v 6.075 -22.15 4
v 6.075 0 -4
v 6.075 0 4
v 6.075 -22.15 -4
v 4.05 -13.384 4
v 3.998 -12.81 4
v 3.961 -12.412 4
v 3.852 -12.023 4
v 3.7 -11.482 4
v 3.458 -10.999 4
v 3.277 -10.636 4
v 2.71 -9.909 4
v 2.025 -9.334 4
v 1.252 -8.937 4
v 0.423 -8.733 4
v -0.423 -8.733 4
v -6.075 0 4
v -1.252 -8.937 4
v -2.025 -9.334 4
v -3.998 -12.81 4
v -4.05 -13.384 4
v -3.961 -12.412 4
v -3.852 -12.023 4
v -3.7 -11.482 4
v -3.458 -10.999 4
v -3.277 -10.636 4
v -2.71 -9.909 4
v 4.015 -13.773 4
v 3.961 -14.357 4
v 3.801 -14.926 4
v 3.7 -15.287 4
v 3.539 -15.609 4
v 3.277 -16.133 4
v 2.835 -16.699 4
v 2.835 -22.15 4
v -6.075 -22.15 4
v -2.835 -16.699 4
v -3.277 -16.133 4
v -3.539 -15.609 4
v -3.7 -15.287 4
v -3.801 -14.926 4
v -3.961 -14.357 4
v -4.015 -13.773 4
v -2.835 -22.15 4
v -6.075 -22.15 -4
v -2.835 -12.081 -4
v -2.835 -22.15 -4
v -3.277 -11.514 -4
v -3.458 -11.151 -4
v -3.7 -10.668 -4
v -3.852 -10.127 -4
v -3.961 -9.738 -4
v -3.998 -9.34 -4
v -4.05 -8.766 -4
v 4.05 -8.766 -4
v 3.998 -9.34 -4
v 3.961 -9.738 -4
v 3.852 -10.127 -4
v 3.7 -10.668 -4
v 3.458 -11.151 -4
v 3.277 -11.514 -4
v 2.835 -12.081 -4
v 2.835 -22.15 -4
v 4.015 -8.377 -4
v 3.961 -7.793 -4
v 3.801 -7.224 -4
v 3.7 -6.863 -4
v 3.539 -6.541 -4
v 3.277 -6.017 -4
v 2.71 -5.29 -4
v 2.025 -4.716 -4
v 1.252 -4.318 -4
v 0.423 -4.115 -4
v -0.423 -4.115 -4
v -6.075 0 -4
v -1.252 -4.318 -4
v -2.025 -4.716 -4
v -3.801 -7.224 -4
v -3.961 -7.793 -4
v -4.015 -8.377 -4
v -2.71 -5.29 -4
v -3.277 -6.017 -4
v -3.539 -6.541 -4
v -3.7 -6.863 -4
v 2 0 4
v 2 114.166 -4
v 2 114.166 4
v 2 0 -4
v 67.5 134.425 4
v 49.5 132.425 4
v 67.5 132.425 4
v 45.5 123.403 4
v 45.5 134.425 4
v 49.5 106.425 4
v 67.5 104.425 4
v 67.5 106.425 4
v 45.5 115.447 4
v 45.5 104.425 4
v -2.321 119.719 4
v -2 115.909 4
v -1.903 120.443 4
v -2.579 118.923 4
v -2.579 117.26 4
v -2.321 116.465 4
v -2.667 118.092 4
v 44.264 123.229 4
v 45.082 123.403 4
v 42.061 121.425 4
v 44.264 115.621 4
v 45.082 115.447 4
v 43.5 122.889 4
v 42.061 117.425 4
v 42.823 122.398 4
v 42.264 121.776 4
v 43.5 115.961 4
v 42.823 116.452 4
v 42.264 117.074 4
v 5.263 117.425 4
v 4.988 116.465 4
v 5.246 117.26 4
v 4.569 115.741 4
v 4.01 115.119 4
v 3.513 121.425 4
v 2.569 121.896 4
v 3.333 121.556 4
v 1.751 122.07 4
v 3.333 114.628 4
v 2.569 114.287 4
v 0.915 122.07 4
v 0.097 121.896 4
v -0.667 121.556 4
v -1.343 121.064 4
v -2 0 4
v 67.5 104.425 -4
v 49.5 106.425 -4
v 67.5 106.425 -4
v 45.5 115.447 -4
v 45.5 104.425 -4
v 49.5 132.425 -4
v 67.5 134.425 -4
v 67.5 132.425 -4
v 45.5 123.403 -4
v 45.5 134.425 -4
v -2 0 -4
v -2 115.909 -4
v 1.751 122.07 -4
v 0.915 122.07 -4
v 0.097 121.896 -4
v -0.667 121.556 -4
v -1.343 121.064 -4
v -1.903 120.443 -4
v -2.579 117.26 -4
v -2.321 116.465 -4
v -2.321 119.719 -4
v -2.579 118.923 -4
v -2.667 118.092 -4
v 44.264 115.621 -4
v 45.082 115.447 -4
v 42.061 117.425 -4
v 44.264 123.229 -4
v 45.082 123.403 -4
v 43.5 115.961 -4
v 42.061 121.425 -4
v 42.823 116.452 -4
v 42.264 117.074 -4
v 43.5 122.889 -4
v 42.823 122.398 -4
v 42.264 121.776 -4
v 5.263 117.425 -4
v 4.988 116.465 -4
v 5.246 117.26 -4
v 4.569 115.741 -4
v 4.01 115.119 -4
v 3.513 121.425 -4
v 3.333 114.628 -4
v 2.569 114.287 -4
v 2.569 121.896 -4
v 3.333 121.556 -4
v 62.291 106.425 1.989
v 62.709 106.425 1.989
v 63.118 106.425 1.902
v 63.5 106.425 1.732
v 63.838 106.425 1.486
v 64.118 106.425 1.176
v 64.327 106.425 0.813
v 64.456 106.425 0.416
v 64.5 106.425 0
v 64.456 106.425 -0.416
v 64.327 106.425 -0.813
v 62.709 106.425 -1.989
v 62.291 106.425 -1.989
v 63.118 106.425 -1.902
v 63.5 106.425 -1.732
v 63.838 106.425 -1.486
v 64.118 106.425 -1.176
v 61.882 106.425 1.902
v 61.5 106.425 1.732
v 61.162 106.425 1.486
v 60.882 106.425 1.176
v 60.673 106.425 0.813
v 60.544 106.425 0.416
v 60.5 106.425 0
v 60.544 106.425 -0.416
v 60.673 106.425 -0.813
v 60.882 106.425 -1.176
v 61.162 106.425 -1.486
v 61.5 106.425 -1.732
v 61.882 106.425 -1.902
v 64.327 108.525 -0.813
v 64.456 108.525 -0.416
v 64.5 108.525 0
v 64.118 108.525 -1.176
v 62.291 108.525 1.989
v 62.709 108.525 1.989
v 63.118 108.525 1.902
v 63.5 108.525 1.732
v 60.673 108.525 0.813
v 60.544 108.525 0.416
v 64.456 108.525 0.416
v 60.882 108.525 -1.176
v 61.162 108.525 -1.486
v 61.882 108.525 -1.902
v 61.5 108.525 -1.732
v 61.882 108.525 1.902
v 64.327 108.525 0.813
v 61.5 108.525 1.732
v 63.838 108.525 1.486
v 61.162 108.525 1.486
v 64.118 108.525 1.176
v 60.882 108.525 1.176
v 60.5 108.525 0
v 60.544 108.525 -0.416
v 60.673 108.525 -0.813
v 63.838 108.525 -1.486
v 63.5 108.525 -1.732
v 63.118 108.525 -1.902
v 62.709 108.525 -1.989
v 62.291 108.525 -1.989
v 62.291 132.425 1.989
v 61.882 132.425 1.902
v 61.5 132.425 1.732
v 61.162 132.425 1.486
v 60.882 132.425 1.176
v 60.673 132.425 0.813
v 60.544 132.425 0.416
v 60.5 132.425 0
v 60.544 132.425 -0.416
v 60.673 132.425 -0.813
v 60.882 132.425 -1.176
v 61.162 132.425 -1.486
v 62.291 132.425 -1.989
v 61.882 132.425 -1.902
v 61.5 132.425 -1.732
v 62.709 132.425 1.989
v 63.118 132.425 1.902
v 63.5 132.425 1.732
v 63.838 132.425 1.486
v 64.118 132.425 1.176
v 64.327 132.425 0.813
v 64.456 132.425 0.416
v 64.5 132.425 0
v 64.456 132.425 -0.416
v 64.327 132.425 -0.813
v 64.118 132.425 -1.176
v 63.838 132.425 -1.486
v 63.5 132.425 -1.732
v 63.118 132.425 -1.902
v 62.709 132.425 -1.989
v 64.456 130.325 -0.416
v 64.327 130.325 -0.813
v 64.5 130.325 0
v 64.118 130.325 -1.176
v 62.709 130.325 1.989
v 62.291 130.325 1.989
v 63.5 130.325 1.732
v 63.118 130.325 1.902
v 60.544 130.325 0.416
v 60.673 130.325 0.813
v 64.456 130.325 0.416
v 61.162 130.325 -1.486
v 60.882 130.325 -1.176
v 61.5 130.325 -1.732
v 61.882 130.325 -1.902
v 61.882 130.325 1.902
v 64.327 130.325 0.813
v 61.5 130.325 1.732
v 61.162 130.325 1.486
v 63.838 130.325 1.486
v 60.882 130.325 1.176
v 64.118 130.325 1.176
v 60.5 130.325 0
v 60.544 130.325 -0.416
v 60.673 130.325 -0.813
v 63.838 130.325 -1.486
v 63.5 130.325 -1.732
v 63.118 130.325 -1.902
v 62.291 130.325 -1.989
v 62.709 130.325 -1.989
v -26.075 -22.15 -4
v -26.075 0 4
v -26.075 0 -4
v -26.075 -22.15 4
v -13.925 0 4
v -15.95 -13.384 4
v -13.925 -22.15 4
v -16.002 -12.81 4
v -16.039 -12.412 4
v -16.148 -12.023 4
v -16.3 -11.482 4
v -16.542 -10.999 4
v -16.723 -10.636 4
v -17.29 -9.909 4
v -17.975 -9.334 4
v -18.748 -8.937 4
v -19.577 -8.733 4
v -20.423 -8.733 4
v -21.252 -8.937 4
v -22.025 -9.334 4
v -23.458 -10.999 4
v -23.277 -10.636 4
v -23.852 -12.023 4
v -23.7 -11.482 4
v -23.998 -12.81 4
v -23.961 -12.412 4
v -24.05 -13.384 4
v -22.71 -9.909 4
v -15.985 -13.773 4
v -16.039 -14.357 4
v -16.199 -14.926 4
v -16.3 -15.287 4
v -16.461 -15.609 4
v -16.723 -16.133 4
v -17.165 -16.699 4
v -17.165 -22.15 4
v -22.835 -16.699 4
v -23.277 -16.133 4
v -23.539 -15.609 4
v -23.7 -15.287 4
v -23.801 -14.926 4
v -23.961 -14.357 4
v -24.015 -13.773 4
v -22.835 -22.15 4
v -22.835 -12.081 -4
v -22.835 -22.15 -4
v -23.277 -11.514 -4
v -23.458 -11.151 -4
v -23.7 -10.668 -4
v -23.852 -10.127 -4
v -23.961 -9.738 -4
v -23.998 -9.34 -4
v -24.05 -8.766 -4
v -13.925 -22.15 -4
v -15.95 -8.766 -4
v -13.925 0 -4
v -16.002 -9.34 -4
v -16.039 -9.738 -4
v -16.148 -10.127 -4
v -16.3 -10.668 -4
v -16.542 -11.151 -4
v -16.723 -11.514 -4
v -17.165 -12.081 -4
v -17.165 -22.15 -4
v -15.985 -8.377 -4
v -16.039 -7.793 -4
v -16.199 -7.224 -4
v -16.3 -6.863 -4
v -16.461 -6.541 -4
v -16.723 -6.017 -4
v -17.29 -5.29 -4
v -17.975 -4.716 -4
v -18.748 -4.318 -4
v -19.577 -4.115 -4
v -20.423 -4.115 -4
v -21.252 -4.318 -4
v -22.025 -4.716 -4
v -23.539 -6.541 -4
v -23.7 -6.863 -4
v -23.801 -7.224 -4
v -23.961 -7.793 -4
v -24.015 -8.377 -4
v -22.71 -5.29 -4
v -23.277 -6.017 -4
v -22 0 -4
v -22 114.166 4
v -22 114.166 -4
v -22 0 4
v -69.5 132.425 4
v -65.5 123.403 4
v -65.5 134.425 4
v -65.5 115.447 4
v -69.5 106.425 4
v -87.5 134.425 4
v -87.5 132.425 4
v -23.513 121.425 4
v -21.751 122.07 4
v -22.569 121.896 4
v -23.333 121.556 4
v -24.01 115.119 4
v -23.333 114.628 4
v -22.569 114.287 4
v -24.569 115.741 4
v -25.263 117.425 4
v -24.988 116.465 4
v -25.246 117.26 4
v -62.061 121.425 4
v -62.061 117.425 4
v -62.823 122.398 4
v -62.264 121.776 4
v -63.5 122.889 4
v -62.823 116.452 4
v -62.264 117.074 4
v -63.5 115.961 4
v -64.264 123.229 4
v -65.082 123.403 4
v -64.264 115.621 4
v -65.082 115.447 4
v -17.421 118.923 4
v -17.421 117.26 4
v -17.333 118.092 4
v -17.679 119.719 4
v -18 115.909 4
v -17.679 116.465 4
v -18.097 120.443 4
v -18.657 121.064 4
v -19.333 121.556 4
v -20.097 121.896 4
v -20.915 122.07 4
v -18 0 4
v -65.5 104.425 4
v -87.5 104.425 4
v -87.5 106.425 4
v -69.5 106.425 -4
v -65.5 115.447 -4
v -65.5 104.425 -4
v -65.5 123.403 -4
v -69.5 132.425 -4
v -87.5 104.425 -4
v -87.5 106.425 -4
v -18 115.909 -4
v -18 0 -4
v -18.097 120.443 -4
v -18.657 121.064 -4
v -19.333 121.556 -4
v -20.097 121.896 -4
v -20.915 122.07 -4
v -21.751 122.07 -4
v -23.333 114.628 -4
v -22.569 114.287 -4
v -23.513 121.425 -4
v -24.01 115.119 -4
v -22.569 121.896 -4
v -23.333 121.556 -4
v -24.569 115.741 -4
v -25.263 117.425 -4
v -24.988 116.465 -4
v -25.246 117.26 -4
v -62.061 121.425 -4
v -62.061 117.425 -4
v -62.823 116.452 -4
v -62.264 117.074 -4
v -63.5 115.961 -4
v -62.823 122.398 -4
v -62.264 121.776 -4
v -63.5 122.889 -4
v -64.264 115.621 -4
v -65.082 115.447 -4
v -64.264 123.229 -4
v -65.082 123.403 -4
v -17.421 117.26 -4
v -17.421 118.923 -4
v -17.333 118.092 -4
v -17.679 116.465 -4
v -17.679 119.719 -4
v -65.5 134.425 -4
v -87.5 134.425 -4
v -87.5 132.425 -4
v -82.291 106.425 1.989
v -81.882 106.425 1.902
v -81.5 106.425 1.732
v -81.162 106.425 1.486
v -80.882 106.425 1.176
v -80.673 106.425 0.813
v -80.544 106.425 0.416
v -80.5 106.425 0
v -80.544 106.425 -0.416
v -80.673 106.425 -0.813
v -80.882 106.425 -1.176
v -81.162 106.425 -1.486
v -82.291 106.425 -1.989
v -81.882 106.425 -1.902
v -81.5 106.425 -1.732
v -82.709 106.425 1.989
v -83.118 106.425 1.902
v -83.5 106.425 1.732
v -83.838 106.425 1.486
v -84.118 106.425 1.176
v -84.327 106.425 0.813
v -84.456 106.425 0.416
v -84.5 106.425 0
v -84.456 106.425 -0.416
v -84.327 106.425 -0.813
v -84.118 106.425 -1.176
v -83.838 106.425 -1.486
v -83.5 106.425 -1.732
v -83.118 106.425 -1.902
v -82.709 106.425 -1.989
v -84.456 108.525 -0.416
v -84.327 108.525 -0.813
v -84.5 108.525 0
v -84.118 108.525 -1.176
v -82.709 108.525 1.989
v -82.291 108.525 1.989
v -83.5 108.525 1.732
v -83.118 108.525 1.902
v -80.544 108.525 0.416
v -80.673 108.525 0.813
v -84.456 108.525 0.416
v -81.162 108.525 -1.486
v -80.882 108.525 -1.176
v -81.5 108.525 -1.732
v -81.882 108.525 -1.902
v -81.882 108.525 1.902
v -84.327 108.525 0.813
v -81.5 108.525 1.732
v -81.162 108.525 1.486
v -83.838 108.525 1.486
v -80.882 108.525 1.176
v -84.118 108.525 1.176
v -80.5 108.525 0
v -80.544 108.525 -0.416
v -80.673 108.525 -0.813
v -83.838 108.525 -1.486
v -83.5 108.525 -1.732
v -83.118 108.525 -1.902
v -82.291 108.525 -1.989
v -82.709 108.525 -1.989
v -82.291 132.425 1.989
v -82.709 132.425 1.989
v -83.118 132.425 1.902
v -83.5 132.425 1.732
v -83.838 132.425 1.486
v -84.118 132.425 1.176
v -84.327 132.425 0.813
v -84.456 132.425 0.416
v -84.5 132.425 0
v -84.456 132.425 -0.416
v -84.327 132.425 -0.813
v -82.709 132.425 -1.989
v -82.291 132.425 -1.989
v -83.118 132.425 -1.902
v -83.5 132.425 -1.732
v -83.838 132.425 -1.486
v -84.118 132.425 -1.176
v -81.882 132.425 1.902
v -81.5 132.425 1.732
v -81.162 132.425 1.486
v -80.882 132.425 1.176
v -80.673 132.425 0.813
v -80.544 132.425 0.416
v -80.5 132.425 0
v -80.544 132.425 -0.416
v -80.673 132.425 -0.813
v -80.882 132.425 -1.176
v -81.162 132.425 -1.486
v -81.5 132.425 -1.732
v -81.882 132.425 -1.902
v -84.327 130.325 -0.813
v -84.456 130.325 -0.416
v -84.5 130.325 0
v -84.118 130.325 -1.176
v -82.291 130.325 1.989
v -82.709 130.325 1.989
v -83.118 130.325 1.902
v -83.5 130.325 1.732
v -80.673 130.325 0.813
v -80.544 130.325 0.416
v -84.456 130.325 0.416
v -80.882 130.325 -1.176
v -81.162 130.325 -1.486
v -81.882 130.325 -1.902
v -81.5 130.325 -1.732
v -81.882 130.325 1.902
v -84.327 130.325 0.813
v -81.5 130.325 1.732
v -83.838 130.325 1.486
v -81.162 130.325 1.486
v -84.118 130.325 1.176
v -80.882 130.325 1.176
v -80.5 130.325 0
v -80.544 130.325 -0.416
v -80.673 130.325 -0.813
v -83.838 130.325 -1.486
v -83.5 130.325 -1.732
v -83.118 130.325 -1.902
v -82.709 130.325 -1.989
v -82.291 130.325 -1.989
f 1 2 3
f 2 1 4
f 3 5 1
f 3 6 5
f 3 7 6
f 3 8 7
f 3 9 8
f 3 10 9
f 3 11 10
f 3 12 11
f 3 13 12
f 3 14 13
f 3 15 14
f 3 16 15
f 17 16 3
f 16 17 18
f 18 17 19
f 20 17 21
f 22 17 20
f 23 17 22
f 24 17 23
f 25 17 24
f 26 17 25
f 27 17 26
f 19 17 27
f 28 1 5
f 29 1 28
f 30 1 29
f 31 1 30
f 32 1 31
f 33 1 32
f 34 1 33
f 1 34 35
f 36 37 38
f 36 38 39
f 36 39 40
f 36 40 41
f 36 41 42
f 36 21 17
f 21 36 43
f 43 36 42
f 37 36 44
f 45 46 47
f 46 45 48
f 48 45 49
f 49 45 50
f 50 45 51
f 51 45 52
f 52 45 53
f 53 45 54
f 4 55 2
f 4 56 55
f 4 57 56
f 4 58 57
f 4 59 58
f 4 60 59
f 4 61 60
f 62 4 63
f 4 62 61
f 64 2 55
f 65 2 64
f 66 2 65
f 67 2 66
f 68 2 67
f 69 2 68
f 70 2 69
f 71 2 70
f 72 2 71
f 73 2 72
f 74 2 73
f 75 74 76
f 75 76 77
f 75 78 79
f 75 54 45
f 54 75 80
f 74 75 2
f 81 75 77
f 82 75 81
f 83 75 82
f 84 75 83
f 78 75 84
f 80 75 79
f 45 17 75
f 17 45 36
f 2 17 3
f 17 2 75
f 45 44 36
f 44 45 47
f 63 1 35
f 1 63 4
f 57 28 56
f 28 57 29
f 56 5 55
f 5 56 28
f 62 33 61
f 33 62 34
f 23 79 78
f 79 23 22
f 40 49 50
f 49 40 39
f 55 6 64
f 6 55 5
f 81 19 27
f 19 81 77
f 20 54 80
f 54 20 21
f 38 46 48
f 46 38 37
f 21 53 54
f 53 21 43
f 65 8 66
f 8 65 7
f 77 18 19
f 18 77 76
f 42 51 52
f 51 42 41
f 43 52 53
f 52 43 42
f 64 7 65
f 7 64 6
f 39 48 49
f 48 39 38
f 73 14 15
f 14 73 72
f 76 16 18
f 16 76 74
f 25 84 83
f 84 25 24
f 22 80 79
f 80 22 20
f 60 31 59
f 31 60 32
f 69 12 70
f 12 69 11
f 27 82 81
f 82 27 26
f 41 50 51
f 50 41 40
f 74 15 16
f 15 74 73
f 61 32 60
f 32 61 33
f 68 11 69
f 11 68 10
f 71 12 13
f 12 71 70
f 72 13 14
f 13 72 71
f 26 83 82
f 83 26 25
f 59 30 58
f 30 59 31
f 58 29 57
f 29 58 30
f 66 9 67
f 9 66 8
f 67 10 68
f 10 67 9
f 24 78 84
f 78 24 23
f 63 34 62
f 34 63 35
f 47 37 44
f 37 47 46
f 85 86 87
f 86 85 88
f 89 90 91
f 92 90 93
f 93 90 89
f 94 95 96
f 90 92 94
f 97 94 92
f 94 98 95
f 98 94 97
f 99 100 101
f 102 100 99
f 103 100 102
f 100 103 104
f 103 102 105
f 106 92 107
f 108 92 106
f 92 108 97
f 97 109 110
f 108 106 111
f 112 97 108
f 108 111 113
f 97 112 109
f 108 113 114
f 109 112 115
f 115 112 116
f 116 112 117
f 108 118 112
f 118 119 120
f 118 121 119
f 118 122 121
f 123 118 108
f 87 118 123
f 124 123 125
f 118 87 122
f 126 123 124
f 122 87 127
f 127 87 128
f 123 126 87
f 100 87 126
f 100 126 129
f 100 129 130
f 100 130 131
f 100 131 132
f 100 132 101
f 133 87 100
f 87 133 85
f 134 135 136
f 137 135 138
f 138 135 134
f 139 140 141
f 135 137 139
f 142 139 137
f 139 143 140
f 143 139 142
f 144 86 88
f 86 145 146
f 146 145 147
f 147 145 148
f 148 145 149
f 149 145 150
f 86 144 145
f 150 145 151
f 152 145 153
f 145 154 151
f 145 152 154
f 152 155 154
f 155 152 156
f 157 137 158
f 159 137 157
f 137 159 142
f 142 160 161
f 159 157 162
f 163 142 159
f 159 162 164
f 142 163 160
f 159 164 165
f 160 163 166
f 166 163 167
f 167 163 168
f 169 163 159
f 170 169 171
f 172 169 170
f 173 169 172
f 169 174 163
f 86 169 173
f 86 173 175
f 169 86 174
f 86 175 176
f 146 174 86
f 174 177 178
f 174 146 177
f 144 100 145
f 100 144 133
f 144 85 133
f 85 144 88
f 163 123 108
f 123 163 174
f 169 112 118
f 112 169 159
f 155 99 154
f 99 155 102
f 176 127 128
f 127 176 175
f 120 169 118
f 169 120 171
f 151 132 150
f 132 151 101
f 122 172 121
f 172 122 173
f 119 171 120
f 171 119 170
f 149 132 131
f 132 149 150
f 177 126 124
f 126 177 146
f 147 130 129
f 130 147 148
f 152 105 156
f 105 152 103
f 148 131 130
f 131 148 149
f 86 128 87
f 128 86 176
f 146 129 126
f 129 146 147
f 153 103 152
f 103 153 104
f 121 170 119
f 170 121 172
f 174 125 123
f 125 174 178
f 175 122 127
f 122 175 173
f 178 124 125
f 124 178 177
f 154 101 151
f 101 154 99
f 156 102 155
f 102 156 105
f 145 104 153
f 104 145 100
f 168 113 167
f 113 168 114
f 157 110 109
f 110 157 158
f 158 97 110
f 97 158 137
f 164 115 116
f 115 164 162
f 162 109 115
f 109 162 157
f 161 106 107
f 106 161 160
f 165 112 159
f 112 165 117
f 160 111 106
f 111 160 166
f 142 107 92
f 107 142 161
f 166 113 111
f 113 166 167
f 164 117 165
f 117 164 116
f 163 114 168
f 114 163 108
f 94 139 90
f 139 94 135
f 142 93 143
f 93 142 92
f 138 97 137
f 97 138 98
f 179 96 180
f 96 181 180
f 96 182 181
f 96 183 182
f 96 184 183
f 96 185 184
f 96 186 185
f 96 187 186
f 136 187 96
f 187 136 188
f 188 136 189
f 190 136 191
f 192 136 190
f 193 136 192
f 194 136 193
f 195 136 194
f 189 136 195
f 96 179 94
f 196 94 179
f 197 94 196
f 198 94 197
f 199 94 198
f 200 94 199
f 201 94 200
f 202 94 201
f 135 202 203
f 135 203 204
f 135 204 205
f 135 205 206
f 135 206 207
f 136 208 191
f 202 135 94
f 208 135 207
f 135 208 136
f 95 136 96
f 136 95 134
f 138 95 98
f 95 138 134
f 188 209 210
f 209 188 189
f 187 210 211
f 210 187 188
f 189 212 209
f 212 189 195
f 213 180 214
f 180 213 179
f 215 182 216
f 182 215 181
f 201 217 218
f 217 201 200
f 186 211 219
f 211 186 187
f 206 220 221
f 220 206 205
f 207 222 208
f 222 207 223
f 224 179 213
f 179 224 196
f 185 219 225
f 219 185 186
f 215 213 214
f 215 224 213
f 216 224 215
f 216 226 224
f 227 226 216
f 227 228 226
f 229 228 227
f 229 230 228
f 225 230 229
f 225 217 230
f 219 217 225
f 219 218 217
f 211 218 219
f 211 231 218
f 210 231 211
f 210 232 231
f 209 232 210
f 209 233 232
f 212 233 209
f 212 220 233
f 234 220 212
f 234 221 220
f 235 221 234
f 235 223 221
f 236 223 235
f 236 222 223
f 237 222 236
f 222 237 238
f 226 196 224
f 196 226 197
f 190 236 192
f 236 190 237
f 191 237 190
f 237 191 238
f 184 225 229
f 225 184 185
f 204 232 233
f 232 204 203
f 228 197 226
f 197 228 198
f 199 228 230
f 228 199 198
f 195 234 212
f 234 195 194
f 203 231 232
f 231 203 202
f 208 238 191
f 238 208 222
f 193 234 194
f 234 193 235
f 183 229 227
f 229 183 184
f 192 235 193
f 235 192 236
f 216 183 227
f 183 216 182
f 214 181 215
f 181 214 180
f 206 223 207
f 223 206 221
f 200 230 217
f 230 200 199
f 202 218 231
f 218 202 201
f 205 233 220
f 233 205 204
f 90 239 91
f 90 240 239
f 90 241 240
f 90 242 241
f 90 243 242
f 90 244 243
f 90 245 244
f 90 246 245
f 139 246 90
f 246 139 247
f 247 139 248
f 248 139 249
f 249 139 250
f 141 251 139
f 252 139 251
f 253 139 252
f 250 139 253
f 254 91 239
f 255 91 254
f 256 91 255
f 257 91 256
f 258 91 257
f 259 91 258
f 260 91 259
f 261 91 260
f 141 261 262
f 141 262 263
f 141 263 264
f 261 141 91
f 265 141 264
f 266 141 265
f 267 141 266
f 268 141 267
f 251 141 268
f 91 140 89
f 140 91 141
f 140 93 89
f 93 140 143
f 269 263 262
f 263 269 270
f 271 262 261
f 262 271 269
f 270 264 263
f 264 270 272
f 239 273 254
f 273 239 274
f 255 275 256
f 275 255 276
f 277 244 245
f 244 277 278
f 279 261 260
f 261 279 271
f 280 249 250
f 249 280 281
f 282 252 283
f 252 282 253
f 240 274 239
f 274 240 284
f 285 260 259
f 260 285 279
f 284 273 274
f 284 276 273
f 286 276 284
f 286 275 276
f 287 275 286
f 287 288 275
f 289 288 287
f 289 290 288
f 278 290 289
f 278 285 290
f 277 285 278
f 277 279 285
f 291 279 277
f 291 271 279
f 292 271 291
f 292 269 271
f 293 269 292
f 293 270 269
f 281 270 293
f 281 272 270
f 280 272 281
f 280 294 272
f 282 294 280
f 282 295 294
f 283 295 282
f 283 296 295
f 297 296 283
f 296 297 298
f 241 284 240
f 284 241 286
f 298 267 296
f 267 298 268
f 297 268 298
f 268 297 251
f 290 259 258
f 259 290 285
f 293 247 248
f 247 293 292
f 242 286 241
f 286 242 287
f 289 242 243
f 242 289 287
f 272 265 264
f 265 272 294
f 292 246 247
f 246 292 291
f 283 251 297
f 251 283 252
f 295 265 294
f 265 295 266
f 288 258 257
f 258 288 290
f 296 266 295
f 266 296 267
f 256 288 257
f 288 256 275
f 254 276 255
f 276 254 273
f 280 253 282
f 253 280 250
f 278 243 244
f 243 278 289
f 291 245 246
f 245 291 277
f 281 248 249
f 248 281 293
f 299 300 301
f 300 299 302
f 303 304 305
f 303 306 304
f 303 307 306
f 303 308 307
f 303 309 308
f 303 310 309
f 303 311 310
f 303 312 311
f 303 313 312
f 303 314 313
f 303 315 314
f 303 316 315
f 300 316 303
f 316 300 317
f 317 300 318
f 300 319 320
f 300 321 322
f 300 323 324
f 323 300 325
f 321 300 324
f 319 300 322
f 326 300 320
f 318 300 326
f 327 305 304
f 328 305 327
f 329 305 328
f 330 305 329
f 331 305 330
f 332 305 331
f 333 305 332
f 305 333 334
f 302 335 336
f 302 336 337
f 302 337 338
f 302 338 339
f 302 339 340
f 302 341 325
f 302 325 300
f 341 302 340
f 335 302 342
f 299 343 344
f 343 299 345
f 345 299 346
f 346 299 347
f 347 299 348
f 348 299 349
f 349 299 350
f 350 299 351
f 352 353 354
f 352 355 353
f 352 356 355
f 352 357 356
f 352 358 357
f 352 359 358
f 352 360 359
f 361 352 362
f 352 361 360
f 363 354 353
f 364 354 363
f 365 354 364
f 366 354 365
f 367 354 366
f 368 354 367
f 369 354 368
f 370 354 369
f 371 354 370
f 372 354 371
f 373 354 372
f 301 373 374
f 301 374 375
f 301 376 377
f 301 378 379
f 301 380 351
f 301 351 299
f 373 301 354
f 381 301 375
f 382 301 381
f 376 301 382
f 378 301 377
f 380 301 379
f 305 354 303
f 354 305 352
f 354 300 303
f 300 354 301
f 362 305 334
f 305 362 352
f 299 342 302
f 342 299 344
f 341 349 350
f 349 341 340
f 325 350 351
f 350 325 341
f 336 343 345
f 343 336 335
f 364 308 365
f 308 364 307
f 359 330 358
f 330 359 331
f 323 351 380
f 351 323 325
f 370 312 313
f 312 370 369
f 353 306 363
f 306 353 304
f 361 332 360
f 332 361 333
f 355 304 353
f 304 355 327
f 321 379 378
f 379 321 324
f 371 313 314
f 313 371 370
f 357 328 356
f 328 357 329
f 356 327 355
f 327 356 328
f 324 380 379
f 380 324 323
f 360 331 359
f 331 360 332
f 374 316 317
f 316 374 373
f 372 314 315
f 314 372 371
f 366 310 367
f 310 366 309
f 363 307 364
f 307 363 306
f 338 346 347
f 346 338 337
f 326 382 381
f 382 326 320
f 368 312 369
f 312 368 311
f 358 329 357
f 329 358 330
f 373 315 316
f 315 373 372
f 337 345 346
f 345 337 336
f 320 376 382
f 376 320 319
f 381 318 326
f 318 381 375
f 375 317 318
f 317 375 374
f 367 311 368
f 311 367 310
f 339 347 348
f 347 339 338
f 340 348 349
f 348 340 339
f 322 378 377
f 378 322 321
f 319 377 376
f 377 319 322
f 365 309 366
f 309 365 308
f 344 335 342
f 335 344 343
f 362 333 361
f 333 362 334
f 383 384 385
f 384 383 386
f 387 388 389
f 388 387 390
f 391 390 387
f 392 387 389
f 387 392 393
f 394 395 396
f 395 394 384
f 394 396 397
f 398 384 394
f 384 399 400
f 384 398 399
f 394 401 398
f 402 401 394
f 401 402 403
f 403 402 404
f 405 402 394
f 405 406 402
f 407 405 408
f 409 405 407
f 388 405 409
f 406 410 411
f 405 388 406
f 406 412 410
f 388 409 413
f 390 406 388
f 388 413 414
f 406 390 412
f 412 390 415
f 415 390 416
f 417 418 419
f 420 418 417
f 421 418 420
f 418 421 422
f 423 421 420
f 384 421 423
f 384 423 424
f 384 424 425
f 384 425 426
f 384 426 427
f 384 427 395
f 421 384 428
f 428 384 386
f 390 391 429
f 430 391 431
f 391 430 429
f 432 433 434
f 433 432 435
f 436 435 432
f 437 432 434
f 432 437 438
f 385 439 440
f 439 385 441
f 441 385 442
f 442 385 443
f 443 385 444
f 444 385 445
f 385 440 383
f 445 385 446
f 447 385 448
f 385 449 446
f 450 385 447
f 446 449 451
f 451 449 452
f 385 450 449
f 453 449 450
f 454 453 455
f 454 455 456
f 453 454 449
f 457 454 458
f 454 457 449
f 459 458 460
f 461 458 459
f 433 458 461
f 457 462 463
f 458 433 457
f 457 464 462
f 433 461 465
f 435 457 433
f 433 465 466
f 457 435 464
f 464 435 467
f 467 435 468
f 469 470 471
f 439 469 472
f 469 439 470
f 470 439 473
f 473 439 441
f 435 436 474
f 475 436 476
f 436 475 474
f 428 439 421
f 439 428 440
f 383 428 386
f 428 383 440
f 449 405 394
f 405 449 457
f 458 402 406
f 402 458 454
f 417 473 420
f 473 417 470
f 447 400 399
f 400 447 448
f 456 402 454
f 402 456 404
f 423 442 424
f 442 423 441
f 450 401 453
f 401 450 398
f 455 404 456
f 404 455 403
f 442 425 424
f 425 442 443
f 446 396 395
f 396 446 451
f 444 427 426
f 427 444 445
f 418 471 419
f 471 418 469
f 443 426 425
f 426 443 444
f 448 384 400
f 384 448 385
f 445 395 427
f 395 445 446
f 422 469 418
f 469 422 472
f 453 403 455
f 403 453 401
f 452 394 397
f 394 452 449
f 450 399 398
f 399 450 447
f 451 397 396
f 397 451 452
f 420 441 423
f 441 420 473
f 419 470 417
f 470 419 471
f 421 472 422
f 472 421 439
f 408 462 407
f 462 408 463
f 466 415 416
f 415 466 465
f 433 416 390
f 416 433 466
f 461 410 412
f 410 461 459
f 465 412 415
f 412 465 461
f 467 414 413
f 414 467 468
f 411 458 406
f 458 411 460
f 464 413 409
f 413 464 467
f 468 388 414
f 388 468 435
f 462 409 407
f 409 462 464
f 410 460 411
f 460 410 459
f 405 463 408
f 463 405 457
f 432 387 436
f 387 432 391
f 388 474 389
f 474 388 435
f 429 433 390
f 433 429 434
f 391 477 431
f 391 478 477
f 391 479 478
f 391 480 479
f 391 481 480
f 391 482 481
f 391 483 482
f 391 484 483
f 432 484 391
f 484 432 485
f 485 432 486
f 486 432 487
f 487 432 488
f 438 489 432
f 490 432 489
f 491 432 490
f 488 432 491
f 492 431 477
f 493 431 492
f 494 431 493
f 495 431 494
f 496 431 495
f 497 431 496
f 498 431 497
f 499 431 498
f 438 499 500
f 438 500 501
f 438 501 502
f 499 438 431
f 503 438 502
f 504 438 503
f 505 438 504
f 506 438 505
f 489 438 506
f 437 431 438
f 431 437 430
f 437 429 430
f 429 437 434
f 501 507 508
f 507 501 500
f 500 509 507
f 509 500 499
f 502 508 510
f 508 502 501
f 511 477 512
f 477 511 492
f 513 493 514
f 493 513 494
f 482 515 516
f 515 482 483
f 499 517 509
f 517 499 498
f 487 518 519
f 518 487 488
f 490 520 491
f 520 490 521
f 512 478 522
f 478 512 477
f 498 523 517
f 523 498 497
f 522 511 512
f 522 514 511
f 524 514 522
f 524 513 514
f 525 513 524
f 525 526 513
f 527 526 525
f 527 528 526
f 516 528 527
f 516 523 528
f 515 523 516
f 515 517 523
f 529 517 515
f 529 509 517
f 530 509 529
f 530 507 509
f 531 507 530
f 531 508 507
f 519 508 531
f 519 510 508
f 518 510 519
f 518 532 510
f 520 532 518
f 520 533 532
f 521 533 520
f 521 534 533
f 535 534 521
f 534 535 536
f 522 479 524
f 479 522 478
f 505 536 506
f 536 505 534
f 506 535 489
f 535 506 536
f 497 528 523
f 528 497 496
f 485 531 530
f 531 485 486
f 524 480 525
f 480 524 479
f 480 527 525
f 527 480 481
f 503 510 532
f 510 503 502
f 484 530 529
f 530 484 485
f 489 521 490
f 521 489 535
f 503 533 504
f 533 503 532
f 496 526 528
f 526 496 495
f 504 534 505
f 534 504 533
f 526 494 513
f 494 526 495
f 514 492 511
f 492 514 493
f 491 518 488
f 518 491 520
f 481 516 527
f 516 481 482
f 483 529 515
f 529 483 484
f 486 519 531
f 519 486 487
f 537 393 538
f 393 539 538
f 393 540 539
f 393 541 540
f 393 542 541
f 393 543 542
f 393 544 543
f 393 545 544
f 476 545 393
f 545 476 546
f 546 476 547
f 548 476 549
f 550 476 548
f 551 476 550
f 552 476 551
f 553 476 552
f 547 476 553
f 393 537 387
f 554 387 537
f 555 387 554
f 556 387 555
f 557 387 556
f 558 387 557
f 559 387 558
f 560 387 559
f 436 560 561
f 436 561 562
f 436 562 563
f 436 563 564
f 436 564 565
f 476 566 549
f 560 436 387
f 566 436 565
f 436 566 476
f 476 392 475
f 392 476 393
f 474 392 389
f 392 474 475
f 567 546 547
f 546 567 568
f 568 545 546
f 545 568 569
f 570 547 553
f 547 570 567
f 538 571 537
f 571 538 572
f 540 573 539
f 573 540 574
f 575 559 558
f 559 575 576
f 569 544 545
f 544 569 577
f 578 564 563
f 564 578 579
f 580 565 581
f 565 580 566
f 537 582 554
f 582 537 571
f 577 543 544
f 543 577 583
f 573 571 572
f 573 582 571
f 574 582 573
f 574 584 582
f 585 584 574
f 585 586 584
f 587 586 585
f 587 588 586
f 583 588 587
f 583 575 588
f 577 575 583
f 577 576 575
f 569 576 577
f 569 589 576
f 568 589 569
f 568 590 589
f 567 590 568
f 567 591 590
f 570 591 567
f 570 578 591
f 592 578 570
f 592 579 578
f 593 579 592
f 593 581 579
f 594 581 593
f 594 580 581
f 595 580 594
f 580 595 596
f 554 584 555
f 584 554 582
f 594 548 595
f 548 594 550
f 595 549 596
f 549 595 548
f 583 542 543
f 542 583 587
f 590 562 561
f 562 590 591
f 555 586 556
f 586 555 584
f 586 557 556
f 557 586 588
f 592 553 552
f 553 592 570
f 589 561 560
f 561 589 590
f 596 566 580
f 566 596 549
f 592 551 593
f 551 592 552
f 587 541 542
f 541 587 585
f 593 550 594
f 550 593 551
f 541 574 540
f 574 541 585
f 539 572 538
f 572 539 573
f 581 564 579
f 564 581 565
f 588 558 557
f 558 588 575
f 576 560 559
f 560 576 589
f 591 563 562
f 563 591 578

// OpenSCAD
//Rod Diameter
diameter=8.1 ;
//height of everything
height=8;
// Distance of the Fan from the middel of the Rod Y-direction
leangth=117.5;
//Distance of the mounting hole to the middel of the Rod in X direction ( not adjusted for clipangel different from 0)
width=62.5;
//angle of the Frame Rods, Mendel has 60° (change this to adjust the angle of the fan if you wnat to point it on the print bed)
rodangel=60;
//angle of the Clip, maybe you want to Fnas to mount like a V
clipangel=0;
//Ratio of the FrameMount Cutout
cutoutRatio=0.7;
//Fanwidth
fanwidth=26; 
//Leagth of the Grip arms, has to be smaller than width
gripleangth=17;


//making the grib module longer when changing the angel of the rod
mountleangth=diameter*1.5+cos(rodangel)*height*2.5;


module grip()
{
translate ([0,-(mountleangth)/2,0])difference()
	{	
	translate([-diameter*3/4,-mountleangth/2,-height/2]) //block
		cube([diameter*3/2,mountleangth,height]);
	
	rotate([-90-rodangel,0,0]) cylinder(h=height*6, r=diameter/2,center=true,$fn=30); //Rod Cutout
	rotate([-90-rodangel,0,0])translate([-diameter*cutoutRatio/2,0,-20]) cube([diameter*cutoutRatio, 40,40]); //Entry Cutout
	}
}

module arm()
{
translate([0,0,-height/2])union()
	{
	translate([-height/4,0,0])cube([height/2,leangth-mountleangth/2+fanwidth/2,height]);
	translate([0,leangth-mountleangth/2-height/4+fanwidth/2,0])cube([width-gripleangth,height/2,height]);
	translate([height/6,leangth-mountleangth/2-height/6+fanwidth/2,0]) cylinder(h=height,r=height/2,$fn=30 );
	translate([width-gripleangth,leangth-mountleangth/2+fanwidth/2,0]) cylinder(h=height,r=height/2,$fn=30 );
	}
}

module clip()
{ translate([width-gripleangth,leangth-mountleangth/2+fanwidth/2,0]) rotate([0,0,clipangel])union(){
mirror([0,1,0]) halfclip();
halfclip();
}}

module halfclip()
{
	translate([0,-(fanwidth)/2,-height/2])union()
	{
	cube([height/2,(fanwidth)/2,height]);
	translate([0,-height/4,0])cube([gripleangth+5,height/4,height]);
	translate([gripleangth, 0, height/2])rotate([-90,0,0])cylinder(h=2.1,r=2,$fn=30);
	}
	

}

module whole()
{union(){
grip();
arm();
clip();
}
}

whole();
translate([-20,0,0]) mirror([1,0,0]) whole();
